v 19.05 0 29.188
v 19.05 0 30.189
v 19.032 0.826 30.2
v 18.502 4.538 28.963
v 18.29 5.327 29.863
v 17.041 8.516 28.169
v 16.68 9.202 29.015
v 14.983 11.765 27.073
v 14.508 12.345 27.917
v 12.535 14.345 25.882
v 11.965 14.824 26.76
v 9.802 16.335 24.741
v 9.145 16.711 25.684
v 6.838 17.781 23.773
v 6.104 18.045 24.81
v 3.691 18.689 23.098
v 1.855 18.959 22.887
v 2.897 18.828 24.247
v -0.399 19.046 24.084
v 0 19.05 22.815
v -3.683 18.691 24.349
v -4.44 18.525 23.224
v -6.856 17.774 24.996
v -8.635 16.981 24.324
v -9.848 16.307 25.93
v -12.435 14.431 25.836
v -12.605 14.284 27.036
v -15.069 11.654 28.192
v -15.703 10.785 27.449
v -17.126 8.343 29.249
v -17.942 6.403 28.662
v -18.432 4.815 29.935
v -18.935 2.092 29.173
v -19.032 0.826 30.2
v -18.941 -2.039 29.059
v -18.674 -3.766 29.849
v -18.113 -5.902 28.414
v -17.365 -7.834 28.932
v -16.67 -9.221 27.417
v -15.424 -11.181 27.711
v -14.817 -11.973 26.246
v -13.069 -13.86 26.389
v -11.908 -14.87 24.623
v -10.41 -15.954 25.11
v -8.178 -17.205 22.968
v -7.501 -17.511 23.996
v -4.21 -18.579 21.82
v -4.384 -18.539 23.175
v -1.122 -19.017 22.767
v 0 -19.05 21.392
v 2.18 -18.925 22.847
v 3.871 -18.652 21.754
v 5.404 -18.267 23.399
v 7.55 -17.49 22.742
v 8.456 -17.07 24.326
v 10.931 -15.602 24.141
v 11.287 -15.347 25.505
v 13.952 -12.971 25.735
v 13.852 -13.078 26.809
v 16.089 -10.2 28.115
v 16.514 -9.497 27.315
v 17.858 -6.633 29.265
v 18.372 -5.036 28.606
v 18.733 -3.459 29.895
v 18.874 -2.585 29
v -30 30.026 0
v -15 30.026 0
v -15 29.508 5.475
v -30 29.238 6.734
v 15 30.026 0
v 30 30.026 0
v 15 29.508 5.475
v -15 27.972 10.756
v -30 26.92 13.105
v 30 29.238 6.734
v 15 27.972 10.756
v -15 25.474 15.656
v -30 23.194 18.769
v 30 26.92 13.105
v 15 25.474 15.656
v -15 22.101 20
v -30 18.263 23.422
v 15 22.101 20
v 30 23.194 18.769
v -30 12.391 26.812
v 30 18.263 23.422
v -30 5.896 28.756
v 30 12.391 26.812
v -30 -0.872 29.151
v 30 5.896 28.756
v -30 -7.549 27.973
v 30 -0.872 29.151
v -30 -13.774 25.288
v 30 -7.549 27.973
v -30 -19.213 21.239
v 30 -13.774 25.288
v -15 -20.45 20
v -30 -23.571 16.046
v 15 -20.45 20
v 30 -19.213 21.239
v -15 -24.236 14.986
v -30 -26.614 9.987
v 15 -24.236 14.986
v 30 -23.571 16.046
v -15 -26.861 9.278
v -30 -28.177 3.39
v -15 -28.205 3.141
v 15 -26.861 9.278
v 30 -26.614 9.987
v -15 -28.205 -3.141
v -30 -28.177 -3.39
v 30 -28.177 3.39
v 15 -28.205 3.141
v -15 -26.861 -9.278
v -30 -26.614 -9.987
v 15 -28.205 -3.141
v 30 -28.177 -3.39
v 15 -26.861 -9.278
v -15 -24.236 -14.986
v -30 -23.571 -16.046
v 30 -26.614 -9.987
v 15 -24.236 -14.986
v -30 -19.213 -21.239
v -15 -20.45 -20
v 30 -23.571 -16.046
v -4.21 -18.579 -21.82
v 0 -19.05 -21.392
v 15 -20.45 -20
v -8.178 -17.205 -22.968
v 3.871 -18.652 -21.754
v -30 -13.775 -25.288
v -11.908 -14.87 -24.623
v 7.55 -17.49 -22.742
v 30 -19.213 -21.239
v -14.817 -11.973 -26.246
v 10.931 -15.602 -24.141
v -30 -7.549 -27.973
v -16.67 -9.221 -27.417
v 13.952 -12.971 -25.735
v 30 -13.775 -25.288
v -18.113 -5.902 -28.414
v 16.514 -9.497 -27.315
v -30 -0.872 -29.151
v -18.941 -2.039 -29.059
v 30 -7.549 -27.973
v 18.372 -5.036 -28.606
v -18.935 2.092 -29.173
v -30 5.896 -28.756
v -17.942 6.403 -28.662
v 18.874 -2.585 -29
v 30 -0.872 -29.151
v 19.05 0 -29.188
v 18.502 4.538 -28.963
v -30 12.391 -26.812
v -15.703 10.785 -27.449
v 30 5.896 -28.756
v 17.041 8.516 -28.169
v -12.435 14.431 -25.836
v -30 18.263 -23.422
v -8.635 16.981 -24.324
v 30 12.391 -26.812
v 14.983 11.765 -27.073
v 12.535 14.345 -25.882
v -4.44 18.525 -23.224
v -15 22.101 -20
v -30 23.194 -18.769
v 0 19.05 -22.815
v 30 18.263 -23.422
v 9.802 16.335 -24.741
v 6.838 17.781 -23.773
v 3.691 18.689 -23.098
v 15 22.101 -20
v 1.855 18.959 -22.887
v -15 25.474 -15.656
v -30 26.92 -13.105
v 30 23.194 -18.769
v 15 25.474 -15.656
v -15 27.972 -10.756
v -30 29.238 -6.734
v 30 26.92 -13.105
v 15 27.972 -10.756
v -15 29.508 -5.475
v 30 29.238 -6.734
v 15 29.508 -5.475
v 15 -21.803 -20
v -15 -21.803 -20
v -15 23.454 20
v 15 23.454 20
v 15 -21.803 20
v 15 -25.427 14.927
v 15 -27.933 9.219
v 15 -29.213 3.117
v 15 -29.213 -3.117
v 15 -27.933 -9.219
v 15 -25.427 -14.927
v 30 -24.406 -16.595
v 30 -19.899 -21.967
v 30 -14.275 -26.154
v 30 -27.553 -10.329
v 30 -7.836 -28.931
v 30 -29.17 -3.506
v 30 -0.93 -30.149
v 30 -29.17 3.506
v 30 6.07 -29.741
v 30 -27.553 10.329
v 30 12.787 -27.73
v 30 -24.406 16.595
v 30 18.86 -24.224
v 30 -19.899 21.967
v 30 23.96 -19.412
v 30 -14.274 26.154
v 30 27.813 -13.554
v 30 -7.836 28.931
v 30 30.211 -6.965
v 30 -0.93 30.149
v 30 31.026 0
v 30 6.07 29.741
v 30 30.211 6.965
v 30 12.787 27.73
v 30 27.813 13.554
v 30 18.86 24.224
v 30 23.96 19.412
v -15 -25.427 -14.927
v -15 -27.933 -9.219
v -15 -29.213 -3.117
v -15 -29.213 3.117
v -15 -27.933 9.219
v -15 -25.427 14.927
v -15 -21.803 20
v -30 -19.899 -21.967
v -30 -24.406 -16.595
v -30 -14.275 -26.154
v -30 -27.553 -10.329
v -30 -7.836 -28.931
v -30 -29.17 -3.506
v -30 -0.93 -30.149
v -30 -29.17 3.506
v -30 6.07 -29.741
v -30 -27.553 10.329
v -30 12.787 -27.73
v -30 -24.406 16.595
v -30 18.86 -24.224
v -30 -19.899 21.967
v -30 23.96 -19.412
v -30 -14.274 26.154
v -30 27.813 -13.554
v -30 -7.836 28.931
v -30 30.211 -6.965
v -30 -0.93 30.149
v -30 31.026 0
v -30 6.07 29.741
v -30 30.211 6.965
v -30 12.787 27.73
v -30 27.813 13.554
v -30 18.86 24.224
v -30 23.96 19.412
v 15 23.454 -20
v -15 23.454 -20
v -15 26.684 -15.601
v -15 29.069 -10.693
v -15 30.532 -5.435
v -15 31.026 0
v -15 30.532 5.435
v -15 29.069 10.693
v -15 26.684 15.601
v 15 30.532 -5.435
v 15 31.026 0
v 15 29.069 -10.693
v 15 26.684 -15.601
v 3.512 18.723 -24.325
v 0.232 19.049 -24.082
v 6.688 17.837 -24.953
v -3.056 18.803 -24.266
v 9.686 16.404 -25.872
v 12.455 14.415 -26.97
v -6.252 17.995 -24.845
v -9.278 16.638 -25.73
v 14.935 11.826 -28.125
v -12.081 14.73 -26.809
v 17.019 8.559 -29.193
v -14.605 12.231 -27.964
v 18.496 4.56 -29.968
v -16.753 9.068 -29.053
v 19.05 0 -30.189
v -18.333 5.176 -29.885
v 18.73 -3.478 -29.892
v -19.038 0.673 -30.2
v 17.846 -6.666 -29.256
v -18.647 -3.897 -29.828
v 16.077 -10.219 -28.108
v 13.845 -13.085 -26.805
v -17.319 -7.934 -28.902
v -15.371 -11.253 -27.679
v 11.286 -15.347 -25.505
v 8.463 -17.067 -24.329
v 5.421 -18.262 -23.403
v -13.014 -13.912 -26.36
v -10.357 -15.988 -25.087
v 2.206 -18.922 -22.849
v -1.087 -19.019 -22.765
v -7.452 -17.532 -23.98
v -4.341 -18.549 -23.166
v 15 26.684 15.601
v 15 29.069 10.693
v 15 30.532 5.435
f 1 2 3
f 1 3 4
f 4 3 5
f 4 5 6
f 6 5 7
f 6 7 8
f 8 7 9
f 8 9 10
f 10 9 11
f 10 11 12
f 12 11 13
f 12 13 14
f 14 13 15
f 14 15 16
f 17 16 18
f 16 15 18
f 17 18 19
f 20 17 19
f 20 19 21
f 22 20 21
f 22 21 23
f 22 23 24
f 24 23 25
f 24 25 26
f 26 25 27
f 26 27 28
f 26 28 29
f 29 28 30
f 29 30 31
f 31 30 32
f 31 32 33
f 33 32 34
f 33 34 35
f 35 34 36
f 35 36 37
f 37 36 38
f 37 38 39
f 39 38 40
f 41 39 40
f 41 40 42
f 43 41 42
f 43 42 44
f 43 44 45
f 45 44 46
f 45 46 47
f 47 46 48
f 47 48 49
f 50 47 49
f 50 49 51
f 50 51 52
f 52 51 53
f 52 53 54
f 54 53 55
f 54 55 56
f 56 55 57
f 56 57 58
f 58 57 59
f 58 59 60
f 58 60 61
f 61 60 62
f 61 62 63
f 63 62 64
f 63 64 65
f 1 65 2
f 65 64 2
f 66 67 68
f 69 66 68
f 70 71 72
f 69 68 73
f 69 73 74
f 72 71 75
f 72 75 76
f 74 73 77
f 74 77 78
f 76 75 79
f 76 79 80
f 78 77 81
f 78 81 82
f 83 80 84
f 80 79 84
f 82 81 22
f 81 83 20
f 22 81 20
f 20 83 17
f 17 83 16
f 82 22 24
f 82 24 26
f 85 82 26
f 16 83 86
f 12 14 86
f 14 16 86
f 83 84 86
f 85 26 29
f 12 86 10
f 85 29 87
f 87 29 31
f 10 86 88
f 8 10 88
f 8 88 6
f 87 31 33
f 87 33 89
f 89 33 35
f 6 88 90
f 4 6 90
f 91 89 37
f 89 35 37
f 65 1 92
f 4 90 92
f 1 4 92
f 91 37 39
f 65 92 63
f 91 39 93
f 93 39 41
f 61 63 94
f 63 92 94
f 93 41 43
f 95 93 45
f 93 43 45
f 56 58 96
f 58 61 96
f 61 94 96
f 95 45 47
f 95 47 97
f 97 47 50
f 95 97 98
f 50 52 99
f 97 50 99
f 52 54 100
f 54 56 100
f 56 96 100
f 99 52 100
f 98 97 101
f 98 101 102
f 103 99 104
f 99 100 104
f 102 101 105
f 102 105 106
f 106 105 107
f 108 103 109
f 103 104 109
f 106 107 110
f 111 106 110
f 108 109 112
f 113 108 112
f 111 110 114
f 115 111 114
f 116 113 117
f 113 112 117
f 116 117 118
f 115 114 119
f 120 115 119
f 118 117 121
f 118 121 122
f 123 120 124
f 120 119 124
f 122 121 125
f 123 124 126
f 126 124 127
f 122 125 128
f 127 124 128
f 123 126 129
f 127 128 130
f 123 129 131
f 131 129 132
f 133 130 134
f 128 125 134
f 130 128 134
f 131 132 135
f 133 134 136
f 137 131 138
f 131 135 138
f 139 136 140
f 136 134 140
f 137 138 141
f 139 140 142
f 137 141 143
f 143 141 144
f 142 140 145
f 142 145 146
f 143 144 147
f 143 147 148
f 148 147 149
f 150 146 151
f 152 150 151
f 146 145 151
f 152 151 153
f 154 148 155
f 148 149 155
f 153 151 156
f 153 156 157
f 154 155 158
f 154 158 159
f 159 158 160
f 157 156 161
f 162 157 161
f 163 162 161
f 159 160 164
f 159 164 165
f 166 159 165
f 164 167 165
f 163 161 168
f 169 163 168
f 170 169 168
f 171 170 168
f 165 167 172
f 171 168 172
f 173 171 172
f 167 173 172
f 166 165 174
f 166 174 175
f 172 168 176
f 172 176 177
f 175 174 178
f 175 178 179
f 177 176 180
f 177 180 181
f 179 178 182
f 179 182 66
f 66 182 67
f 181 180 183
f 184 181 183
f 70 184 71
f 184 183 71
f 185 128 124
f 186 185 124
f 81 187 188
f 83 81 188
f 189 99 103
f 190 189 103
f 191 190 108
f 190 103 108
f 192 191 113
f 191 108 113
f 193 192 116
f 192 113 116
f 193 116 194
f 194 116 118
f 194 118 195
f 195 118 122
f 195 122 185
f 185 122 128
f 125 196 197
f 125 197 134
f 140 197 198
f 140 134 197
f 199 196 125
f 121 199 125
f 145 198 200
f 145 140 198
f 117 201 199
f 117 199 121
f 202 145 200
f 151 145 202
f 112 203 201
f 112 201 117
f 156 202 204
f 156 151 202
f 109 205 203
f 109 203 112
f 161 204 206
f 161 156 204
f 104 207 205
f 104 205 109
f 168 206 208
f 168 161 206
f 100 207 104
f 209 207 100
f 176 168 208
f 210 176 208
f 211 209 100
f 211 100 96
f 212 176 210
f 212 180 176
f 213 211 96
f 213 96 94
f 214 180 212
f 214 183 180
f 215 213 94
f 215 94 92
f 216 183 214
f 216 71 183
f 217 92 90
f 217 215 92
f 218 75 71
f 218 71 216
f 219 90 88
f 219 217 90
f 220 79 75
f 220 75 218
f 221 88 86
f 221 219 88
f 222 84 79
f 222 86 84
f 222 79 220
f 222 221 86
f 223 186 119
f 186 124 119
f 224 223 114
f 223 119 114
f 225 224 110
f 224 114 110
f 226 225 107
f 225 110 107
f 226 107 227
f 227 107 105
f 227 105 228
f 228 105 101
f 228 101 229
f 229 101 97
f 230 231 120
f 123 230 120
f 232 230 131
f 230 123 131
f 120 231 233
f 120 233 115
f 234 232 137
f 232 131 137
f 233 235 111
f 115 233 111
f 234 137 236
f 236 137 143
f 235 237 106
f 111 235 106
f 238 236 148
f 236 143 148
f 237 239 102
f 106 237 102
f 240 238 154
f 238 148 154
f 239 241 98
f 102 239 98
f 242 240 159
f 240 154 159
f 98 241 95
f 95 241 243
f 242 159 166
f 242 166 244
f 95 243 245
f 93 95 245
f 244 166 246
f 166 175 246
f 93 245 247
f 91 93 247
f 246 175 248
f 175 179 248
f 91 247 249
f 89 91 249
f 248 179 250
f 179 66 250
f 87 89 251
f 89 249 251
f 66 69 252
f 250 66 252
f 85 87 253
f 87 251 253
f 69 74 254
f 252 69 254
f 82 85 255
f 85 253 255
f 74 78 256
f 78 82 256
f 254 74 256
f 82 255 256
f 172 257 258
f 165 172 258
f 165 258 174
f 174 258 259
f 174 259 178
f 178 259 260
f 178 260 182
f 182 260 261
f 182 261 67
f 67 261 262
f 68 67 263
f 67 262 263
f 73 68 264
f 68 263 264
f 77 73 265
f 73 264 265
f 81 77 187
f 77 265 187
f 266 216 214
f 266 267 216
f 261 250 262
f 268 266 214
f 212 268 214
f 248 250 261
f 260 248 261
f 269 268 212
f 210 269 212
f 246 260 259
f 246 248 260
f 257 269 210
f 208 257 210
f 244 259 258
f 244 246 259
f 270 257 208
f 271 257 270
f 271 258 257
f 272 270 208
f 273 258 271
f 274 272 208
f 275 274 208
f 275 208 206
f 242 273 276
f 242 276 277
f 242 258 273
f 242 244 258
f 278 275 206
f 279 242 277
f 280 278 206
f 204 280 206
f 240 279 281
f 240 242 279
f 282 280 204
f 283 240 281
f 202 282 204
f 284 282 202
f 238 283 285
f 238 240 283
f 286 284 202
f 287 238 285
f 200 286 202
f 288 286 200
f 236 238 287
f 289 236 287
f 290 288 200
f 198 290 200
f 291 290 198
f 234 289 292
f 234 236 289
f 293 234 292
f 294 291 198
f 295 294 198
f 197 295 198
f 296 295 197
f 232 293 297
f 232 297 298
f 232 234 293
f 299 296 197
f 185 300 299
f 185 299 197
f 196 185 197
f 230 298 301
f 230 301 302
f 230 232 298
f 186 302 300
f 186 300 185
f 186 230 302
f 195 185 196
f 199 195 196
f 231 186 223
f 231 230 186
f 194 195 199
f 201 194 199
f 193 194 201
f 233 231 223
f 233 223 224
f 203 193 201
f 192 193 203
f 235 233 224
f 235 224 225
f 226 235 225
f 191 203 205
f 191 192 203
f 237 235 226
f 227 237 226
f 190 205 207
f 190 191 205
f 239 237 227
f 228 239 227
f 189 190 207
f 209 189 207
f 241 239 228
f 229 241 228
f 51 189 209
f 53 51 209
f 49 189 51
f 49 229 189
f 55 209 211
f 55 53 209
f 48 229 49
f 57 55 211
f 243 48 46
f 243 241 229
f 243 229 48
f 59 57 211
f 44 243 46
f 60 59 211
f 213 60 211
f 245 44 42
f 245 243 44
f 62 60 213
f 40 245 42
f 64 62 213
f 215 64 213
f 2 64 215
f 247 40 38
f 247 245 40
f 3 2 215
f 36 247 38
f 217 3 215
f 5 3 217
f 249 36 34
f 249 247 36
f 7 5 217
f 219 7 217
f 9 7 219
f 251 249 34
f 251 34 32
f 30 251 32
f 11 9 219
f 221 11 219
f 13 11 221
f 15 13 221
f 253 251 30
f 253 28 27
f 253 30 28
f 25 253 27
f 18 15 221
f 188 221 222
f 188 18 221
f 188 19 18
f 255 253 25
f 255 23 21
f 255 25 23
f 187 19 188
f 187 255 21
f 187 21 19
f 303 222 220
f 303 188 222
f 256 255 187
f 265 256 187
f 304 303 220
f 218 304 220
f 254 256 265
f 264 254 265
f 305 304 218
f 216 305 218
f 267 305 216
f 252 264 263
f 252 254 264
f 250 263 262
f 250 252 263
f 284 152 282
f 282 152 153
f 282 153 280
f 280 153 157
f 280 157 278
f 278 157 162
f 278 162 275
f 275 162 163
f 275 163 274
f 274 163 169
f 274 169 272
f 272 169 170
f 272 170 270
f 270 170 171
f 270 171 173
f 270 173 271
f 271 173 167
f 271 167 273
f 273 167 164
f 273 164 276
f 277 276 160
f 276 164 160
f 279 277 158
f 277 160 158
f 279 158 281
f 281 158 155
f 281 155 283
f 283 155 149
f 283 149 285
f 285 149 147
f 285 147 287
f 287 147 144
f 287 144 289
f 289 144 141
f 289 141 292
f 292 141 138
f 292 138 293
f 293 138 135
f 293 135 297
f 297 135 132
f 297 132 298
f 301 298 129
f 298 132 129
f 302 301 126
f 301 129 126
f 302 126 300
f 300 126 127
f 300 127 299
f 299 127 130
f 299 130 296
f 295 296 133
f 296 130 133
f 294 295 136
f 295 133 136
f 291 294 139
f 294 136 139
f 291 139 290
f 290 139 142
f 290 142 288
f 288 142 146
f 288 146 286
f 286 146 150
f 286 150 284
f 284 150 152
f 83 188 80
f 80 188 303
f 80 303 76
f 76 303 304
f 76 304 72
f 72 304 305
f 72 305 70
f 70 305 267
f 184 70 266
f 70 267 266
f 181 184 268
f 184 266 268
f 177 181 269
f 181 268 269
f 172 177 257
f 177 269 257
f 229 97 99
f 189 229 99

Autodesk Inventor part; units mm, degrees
ref_plane "YZ Plane" through (0, 0, 0) normal (1, 0, 0) x (0, 1, 0)
sketch "Sketch1" plane through (0, 0, 0) normal (1, 0, 0) x (0, 1, 0)
  circle A0 centre (0.8255, 0) radius 29.2
  circle A1 centre (0.8255, 0) radius 30.2
  point P0 (0, 0)
  dimension "d0" = 58.4
  dimension "d1" = 60.4
extrude "Extrusion1" add sketch "Sketch1" along normal mid plane 60
ref_plane "Work Plane1" through (0, 31.0255, 0) normal (0, 1, 0) x (-1, 0, 0)
sketch "Sketch2" plane through (0, 31.0255, 0) normal (0, 1, 0) x (-1, 0, 0)
  line L0 (-15, -20) -> (15, -20)
  line L1 (15, -20) -> (15, 20)
  line L2 (15, 20) -> (-15, 20)
  line L3 (-15, 20) -> (-15, -20)
  line L4 (-15, -20) -> (15, 20) construction
  line L5 (15, -20) -> (-15, 20) construction
  point P0 (0, 0)
  dimension "d4" = 30
  dimension "d5" = 40
extrude "Extrusion2" cut sketch "Sketch2" against normal blind 80
ref_plane "Work Plane2" through (0, 0.8255, 30.2) normal (0, 0, 1) x (1, 0, 0)
sketch "Sketch3" plane through (0, 0.8255, 30.2) normal (0, 0, 1) x (1, 0, 0)
  circle A0 centre (0, -0.8255) radius 19.05
  dimension "d8" = 38.1
extrude "Extrusion3" cut sketch "Sketch3" against normal blind 80
properties part number "scatterBlock"
